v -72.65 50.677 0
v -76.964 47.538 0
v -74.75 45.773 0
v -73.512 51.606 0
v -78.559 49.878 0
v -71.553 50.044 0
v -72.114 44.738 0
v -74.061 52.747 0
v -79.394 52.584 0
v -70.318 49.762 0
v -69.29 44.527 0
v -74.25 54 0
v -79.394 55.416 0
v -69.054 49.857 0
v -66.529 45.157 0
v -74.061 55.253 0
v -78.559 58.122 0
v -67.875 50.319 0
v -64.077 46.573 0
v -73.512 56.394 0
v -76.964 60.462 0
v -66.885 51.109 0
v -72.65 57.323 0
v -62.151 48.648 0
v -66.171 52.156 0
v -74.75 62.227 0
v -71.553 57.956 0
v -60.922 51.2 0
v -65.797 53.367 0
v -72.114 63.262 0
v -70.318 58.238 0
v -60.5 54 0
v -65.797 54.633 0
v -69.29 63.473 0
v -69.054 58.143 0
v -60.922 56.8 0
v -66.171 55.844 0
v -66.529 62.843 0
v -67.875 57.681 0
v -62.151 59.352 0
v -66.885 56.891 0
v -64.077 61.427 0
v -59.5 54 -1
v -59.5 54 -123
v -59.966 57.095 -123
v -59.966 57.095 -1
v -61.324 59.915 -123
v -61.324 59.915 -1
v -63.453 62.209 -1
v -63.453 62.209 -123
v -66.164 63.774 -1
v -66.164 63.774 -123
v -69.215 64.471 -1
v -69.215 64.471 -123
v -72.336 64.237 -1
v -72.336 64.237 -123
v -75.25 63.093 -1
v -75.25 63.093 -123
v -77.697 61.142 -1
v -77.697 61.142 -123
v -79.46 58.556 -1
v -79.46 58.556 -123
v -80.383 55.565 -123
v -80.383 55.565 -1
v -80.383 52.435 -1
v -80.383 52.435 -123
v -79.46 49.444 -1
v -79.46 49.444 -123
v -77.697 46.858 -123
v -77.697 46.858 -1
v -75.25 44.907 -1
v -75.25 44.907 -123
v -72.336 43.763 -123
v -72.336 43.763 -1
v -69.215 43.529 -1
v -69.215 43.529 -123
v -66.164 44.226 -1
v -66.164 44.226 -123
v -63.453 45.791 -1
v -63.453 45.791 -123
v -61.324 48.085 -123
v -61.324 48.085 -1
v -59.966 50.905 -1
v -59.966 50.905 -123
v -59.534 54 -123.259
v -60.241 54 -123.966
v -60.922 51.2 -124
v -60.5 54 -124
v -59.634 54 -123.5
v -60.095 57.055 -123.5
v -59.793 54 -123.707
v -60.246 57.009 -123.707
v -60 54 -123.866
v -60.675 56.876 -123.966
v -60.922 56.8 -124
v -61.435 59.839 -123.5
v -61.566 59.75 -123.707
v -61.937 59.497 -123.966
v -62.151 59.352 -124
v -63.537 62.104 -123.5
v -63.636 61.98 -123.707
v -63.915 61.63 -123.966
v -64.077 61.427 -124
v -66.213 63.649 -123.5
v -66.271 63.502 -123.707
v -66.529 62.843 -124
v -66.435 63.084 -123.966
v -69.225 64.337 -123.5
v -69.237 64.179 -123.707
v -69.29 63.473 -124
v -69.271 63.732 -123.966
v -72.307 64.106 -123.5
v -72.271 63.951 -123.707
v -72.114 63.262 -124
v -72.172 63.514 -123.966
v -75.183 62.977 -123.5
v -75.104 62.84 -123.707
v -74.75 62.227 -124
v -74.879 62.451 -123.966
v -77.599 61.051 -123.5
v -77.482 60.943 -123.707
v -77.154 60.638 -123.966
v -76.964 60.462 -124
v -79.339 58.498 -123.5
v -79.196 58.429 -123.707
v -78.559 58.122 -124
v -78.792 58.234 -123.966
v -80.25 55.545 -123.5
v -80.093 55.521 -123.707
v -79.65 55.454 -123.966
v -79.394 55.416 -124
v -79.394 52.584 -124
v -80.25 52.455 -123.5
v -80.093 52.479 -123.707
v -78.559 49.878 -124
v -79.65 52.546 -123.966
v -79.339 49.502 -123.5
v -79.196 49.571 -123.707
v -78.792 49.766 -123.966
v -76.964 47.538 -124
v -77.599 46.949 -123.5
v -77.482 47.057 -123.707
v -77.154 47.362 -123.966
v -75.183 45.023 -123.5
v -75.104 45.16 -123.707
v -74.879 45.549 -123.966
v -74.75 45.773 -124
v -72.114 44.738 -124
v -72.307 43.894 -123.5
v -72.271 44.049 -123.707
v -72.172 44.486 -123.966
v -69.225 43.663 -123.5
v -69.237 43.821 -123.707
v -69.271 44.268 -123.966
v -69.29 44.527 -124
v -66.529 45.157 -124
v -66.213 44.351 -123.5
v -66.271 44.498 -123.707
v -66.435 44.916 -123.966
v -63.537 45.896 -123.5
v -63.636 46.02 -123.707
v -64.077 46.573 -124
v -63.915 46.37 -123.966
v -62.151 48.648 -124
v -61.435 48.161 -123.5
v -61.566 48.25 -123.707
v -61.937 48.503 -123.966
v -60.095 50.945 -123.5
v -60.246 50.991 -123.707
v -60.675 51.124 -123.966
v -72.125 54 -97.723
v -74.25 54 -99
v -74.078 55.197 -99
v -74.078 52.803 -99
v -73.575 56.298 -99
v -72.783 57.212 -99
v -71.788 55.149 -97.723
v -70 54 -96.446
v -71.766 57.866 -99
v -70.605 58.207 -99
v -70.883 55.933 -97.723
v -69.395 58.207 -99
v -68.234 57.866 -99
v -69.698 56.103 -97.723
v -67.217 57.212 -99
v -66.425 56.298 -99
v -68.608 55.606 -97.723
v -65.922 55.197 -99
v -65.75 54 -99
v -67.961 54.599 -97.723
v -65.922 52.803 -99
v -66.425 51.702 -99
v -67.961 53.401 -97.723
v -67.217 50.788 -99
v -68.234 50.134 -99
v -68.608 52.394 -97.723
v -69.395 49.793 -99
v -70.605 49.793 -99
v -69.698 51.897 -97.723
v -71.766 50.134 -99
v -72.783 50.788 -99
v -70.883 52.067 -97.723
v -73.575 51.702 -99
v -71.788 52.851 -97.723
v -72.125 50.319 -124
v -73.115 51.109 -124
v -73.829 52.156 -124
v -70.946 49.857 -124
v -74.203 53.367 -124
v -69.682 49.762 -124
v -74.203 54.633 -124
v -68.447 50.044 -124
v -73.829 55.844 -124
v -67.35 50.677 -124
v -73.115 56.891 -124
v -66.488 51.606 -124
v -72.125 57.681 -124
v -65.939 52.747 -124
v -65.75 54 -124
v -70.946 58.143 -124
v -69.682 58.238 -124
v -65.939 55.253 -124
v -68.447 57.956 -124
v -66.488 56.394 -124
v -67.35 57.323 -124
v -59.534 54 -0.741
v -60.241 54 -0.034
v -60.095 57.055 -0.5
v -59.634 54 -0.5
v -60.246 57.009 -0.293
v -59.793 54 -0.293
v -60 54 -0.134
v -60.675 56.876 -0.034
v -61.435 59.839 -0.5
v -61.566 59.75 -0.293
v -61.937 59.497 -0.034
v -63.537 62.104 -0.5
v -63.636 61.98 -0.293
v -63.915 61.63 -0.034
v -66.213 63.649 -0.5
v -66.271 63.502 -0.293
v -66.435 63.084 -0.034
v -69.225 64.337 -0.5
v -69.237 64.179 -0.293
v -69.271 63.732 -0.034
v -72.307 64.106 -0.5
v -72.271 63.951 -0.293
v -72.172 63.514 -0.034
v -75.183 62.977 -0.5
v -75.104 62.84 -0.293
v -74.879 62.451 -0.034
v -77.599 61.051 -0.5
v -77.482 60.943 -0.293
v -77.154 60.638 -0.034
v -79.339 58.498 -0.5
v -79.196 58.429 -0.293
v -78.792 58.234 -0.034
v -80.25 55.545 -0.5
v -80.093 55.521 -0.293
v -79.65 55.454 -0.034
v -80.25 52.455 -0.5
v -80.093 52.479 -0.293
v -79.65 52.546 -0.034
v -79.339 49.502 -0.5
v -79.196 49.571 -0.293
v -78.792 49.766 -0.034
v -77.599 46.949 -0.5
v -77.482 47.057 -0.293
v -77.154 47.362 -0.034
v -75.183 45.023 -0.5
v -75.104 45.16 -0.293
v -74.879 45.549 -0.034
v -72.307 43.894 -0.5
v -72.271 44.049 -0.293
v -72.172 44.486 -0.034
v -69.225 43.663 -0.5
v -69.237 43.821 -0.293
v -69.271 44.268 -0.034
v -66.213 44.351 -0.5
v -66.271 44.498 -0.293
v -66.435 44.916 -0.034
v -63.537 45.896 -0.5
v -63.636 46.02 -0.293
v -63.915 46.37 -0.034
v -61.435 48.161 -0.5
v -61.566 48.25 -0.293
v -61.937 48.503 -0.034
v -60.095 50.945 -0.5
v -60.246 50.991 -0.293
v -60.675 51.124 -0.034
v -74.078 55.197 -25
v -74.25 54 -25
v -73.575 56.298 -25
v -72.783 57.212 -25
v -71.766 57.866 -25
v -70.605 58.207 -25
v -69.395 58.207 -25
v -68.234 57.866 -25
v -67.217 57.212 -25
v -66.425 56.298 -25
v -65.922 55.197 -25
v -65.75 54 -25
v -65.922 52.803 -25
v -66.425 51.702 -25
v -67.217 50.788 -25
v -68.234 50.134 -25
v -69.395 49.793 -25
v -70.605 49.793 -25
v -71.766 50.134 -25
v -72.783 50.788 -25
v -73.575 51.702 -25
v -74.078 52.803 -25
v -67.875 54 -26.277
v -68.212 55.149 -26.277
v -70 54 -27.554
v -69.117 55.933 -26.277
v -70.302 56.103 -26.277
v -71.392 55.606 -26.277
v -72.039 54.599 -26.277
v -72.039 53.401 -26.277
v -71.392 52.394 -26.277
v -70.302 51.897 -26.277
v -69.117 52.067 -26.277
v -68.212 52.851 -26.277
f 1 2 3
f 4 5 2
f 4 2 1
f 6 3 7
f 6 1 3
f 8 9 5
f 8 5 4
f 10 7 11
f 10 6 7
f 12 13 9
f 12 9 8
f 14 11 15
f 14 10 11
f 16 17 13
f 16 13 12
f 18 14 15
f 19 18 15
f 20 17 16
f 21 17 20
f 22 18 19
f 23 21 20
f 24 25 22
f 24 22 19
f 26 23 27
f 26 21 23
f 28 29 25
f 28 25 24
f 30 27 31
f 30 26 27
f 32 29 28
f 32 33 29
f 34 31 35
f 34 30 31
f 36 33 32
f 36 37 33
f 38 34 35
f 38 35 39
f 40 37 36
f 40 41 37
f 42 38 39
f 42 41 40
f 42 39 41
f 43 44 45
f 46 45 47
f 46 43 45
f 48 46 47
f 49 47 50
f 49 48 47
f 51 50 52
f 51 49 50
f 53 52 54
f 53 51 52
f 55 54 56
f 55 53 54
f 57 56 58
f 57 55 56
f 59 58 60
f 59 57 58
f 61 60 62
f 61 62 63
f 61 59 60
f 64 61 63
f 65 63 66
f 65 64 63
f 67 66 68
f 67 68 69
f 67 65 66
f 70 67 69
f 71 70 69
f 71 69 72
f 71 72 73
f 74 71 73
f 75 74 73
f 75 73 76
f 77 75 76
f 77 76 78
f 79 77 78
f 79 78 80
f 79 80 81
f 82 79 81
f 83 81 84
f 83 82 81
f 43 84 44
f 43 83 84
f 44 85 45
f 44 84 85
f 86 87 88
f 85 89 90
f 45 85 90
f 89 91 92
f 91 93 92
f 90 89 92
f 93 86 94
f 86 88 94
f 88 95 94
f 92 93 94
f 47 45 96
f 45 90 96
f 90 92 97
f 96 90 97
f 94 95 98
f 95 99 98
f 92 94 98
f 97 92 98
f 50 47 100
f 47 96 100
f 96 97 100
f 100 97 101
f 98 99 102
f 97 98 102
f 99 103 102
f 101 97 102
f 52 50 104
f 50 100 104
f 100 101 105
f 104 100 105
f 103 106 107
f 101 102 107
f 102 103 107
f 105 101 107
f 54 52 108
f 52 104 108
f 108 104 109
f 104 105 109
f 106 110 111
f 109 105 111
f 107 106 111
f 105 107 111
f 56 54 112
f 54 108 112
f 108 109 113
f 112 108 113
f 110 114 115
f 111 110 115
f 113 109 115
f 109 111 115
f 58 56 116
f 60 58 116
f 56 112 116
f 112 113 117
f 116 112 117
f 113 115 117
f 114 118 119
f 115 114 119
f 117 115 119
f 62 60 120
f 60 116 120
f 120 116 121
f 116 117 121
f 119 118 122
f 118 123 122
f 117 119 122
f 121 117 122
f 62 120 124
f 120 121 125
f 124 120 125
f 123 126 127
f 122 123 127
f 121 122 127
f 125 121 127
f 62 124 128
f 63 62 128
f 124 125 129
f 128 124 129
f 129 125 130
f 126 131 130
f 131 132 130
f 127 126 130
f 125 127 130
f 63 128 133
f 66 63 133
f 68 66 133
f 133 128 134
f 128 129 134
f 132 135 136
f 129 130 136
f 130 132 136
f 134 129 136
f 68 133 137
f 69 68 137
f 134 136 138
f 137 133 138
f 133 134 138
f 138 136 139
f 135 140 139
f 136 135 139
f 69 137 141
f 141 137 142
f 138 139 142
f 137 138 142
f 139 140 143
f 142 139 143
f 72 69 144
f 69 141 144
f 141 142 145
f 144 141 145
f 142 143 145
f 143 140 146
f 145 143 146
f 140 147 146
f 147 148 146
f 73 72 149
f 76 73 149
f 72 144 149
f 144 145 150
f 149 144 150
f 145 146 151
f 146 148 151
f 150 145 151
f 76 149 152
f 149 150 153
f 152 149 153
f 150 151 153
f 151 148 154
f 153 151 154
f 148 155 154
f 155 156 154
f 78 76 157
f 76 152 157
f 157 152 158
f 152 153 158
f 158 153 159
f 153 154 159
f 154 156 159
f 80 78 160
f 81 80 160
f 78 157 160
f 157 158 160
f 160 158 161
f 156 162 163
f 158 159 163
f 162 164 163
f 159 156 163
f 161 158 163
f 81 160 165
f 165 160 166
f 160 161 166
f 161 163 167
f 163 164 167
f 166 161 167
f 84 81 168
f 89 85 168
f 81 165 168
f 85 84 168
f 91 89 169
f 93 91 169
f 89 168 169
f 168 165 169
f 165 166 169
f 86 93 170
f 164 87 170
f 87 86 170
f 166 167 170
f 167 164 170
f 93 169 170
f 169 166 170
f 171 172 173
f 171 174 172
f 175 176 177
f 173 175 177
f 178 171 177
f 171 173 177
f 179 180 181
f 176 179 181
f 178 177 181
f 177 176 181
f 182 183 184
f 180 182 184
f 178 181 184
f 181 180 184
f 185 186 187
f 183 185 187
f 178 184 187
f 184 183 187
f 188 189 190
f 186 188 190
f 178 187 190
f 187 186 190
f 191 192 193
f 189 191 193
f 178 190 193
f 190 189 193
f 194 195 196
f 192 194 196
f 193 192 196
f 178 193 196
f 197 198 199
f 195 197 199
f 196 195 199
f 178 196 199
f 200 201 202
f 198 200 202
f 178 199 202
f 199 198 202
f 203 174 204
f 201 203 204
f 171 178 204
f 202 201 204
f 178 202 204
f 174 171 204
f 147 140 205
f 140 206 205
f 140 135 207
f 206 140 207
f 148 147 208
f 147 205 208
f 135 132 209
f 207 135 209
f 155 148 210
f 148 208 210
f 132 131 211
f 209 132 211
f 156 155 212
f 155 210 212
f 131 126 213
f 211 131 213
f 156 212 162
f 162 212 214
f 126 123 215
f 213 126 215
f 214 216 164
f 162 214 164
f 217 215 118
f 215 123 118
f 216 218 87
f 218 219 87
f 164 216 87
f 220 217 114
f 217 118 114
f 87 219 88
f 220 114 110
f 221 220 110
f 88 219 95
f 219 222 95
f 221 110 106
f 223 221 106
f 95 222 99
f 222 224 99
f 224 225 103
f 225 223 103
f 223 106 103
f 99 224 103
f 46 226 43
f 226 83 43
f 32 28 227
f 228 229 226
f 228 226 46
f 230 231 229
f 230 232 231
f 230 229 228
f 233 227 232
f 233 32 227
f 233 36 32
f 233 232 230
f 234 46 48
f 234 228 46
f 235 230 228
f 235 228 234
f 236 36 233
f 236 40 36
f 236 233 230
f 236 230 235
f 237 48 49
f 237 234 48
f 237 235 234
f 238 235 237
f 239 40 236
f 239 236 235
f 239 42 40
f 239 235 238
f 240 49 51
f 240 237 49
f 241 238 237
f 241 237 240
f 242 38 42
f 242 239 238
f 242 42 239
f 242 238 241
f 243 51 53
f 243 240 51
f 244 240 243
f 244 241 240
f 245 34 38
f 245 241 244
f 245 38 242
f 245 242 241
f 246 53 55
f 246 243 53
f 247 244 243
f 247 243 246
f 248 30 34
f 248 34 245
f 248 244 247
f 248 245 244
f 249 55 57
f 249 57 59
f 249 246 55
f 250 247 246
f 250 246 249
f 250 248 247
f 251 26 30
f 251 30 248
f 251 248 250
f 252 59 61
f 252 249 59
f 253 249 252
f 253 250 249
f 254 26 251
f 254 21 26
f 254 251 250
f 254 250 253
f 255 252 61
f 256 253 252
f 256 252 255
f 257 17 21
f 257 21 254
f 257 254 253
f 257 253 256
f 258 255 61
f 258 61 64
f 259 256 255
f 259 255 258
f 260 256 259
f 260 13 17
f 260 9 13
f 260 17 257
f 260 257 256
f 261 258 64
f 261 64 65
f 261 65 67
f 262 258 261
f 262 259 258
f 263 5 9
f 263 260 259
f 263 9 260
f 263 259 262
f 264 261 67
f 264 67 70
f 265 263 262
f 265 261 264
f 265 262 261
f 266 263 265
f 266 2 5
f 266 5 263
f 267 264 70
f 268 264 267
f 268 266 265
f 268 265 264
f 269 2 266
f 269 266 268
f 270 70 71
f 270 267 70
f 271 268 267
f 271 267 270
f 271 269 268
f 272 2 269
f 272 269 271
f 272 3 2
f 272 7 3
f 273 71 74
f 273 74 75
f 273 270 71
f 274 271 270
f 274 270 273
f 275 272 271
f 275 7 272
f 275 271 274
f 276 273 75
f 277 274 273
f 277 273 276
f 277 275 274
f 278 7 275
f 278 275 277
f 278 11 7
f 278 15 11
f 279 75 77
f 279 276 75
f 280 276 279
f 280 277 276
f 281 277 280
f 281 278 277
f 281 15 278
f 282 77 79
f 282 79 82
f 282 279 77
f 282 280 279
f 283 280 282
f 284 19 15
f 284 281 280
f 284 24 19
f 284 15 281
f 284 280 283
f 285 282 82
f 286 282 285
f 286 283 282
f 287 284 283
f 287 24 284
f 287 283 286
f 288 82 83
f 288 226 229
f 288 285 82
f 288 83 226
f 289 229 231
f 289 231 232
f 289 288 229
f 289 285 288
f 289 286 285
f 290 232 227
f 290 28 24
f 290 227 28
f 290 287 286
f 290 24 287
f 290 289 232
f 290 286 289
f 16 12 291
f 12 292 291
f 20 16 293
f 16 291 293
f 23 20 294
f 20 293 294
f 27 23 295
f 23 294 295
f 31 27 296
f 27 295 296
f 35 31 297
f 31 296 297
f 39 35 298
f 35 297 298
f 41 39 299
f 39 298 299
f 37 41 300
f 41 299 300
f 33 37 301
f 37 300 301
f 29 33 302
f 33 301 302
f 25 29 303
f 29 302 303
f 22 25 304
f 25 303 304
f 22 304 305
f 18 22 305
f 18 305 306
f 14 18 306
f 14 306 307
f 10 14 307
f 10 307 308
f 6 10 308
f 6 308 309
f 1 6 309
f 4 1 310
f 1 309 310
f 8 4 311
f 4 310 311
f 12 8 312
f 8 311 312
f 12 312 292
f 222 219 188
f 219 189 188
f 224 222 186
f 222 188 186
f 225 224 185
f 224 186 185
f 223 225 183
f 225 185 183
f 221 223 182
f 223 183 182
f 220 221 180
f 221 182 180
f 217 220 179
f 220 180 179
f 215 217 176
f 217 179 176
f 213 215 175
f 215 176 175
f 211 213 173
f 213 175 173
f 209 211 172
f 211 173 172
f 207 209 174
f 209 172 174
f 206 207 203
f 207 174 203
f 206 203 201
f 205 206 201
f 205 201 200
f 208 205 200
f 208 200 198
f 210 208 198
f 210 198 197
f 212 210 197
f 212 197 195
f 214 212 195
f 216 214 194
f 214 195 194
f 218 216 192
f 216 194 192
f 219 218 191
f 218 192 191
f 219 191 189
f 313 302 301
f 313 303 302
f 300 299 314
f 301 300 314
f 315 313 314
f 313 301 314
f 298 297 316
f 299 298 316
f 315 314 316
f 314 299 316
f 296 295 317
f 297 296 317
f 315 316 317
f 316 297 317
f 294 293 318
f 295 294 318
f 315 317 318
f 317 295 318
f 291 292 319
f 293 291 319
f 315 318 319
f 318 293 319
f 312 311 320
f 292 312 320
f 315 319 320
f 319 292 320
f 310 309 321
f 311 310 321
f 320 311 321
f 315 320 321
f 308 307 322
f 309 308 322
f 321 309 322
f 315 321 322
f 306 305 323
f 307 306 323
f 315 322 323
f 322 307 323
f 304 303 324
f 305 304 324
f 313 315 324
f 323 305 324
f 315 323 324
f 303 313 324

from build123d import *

# Parameters (mm, degrees)
ESBO_O1_R                                    = 10.5
RESSALTO_EXTRUS_O1_DEPTH                     = 124
FILETE1_R                                    = 1
BROCA_DE_ROSQUEAR_PARA_TARRAXA_DE_M101_D     = 8.5
BROCA_DE_ROSQUEAR_PARA_TARRAXA_DE_M101_DEPTH = 25
BROCA_DE_ROSQUEAR_PARA_TARRAXA_DE_M101_TIP   = 2.553657631
BROCA_DE_ROSQUEAR_PARA_TARRAXA_DE_M102_D     = 8.5
BROCA_DE_ROSQUEAR_PARA_TARRAXA_DE_M102_DEPTH = 25
BROCA_DE_ROSQUEAR_PARA_TARRAXA_DE_M102_TIP   = 2.553657631


with BuildPart() as part:
    # Esboço1 → Ressalto-extrusão1 (new body)
    with BuildSketch(Plane.XY):
        with Locations((-70, 54)):
            Circle(ESBO_O1_R)
    extrude(amount=-RESSALTO_EXTRUS_O1_DEPTH)

    # Filete1
    filete1_edges = [part.edges().sort_by_distance(p)[0] for p in [
        (-80.5, 54, 0),
        (-80.5, 54, -124),
    ]]
    fillet(filete1_edges, radius=FILETE1_R)

    # Broca de rosquear para tarraxa de M101
    with Locations(Plane.XY):
        with Locations((-70, 54)):
            Hole(BROCA_DE_ROSQUEAR_PARA_TARRAXA_DE_M101_D / 2, depth=BROCA_DE_ROSQUEAR_PARA_TARRAXA_DE_M101_DEPTH)
            with Locations((0, 0, -(BROCA_DE_ROSQUEAR_PARA_TARRAXA_DE_M101_DEPTH + BROCA_DE_ROSQUEAR_PARA_TARRAXA_DE_M101_TIP / 2))):  # 118° drill point
                Cone(0, BROCA_DE_ROSQUEAR_PARA_TARRAXA_DE_M101_D / 2, BROCA_DE_ROSQUEAR_PARA_TARRAXA_DE_M101_TIP, mode=Mode.SUBTRACT)

    # Broca de rosquear para tarraxa de M102
    with Locations(Plane(origin=(0, 0, -124), x_dir=(-1, 0, 0), z_dir=(0, 0, -1))):
        with Locations((70, 54)):
            Hole(BROCA_DE_ROSQUEAR_PARA_TARRAXA_DE_M102_D / 2, depth=BROCA_DE_ROSQUEAR_PARA_TARRAXA_DE_M102_DEPTH)
            with Locations((0, 0, -(BROCA_DE_ROSQUEAR_PARA_TARRAXA_DE_M102_DEPTH + BROCA_DE_ROSQUEAR_PARA_TARRAXA_DE_M102_TIP / 2))):  # 118° drill point
                Cone(0, BROCA_DE_ROSQUEAR_PARA_TARRAXA_DE_M102_D / 2, BROCA_DE_ROSQUEAR_PARA_TARRAXA_DE_M102_TIP, mode=Mode.SUBTRACT)


solid = part.part
